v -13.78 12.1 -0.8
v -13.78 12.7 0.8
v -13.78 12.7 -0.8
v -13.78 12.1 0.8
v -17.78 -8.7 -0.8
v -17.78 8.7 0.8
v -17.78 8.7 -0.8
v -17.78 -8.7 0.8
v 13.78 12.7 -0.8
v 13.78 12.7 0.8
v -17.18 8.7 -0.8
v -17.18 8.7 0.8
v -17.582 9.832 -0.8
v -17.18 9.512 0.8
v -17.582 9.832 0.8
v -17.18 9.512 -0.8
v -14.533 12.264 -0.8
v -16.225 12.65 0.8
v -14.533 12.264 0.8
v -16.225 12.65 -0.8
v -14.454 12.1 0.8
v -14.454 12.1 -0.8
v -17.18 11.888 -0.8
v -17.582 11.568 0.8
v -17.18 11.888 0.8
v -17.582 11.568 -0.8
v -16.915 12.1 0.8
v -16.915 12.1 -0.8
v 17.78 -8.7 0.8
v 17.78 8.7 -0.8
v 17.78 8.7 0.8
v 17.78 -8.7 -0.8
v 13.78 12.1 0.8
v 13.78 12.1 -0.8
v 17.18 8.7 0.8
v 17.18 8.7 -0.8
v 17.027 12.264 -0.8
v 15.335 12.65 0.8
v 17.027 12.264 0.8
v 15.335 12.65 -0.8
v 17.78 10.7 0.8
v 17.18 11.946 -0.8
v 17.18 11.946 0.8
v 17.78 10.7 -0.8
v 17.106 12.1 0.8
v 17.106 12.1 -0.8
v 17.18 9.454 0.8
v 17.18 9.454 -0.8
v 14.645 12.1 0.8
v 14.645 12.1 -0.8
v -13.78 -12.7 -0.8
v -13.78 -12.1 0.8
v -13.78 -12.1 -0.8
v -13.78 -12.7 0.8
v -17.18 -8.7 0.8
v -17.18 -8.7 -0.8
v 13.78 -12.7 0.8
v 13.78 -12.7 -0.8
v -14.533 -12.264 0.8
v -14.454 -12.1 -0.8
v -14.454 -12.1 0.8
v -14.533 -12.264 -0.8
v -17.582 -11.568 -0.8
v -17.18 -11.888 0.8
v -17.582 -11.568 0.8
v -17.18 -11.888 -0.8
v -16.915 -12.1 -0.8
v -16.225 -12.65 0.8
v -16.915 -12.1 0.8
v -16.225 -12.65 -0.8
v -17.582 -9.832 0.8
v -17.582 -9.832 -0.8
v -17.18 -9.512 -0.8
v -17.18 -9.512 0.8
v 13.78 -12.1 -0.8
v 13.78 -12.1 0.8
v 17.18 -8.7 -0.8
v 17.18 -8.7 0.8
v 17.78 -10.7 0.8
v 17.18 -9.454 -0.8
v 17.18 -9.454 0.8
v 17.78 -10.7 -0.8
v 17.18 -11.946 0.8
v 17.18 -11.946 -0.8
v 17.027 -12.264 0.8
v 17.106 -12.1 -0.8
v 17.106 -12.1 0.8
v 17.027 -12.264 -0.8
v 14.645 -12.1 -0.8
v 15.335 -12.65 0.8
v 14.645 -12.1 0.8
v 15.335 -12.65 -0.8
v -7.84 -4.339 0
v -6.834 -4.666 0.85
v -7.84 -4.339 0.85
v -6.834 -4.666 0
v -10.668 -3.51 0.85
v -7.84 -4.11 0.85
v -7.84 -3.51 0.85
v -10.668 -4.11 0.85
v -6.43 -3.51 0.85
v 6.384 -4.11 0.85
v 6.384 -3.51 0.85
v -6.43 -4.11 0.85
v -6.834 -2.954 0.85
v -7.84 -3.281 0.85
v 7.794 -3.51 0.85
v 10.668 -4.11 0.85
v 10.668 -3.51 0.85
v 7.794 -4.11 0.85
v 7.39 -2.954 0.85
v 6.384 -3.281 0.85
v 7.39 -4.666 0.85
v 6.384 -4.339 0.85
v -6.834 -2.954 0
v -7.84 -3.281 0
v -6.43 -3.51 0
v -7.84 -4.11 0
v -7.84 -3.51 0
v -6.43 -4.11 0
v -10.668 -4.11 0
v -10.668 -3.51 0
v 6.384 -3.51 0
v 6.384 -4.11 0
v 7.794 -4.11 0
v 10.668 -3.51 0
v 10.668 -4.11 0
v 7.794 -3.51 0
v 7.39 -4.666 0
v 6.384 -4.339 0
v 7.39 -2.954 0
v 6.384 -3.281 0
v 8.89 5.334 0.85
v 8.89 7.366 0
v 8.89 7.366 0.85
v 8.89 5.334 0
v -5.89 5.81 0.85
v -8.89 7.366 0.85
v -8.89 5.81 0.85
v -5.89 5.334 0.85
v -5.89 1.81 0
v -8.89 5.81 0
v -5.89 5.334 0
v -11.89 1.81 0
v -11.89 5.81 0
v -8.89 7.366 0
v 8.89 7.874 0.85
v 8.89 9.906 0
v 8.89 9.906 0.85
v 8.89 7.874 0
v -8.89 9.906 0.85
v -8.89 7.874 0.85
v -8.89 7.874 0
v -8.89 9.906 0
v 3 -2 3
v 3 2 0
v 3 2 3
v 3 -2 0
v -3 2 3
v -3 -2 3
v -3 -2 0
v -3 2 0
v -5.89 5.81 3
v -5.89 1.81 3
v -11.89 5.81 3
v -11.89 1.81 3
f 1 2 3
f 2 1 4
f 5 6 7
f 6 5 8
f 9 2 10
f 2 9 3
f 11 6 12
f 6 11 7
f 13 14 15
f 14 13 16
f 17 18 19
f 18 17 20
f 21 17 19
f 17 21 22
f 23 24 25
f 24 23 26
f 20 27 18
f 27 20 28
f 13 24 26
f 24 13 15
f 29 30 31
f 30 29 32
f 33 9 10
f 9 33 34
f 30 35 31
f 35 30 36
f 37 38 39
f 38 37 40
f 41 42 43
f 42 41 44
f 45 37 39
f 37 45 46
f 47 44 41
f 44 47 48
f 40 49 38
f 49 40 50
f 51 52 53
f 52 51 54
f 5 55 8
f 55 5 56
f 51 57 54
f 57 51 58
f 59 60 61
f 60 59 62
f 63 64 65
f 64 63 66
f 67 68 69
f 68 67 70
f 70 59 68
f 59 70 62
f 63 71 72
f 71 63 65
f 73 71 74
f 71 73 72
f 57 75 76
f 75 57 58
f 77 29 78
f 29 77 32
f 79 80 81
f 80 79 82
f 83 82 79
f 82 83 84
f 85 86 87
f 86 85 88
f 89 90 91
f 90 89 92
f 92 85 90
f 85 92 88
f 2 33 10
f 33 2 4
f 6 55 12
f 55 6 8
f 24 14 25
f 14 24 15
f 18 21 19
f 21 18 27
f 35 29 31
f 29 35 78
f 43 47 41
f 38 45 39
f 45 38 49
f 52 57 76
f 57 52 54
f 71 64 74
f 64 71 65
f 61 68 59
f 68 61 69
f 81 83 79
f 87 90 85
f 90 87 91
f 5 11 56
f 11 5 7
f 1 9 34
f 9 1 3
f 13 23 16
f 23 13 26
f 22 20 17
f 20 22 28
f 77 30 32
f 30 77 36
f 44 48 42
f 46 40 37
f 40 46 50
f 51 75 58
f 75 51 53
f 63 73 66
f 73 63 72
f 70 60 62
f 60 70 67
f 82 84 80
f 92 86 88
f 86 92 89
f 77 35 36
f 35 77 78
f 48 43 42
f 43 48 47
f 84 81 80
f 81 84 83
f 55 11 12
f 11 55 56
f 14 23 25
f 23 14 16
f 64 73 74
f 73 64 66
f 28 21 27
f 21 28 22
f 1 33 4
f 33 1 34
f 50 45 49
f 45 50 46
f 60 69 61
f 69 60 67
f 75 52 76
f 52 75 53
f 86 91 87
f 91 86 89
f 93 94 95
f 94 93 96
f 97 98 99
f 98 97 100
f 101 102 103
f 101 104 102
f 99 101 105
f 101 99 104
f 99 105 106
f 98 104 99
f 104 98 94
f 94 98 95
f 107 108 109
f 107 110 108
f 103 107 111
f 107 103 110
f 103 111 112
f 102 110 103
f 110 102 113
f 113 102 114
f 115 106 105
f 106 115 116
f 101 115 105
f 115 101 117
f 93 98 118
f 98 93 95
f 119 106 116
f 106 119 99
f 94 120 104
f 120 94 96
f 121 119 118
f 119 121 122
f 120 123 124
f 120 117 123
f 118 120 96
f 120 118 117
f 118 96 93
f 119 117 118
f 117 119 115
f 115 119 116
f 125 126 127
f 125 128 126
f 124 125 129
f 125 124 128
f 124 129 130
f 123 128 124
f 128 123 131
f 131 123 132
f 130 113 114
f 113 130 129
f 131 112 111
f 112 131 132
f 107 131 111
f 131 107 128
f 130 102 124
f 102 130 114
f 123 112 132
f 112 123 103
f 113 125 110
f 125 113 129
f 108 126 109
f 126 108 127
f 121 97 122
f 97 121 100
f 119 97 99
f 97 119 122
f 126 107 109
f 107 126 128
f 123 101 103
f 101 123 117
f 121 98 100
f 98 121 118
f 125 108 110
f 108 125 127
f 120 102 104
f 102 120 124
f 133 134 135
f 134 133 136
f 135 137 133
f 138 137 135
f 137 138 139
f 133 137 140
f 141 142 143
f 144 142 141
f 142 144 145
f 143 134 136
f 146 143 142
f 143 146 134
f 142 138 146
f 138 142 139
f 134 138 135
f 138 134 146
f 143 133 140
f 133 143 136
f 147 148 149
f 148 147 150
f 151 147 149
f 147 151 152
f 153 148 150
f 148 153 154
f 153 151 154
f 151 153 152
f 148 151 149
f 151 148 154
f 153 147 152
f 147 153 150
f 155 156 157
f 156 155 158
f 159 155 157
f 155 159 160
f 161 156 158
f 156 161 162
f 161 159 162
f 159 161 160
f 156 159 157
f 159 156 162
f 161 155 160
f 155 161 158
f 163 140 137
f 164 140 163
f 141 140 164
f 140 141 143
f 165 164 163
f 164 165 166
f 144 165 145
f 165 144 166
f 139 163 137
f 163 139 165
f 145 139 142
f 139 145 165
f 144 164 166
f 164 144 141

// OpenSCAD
// Parameters
pcb_length = 35.56; //[17.78:71.12:0.1]
pcb_width = 25.4; //[12.7:50.8:0.1]
pcb_thickness = 1.6; //[0.8:3.2:0.1]
corner_radius = 2.0; //[0.5:6.0:0.1]
edge_chamfer = 0.6; //[0.2:1.5:0.1]
mount_hole_diameter = 3.2; //[2.0:5.0:0.1]
mount_hole_edge_offset_x = 3.5; //[2.0:8.0:0.1]
mount_hole_edge_offset_y = 3.5; //[2.0:8.0:0.1]
copper_thickness = 0.05; //[0.02:0.2:0.01]
silkscreen_thickness = 0.05; //[0.02:0.2:0.01]
pad_diameter = 1.8; //[1.0:3.5:0.1]
trace_width = 0.6; //[0.2:2.0:0.1]
component_body_height = 3.0; //[1.0:10.0:0.1]
component_body_length = 6.0; //[2.0:15.0:0.1]
component_body_width = 4.0; //[2.0:12.0:0.1]
overlap = 0.8; //[0.2:2.0:0.1]

// Base Shapes
module pcb_body_base() {
  cube([pcb_length, pcb_width, pcb_thickness], center=true);
}

module rounded_corner_cyl() {
  cylinder(r=corner_radius, h=pcb_thickness + overlap*2, center=true);
}

module corner_cut_box() {
  cube([corner_radius*2, corner_radius*2, pcb_thickness + overlap*2], center=true);
}

module edge_chamfer_cut_top() {
  cube([pcb_length - edge_chamfer*2, pcb_width - edge_chamfer*2, pcb_thickness], center=true);
}

module edge_chamfer_cut_bottom() {
  cube([pcb_length - edge_chamfer*2, pcb_width - edge_chamfer*2, pcb_thickness], center=true);
}

module mount_hole_cyl() {
  cylinder(r=mount_hole_diameter/2, h=pcb_thickness + overlap*4, center=true);
}

module copper_pad_cyl() {
  cylinder(r=pad_diameter/2, h=copper_thickness + overlap, center=true);
}

module copper_trace_box() {
  cube([pcb_length*0.6, trace_width, copper_thickness + overlap], center=true);
}

module silkscreen_box() {
  cube([pcb_length*0.5, pcb_width*0.08, silkscreen_thickness + overlap], center=true);
}

module component_body_box() {
  cube([component_body_length, component_body_width, component_body_height], center=true);
}

// Operations
module corner_diff_tl() {
  difference() {
    translate([-pcb_length/2 + corner_radius, pcb_width/2 - corner_radius, 0]) corner_cut_box();
    translate([-pcb_length/2 + corner_radius, pcb_width/2 - corner_radius, 0]) rounded_corner_cyl();
  }
}

module corner_diff_tr() {
  difference() {
    translate([pcb_length/2 - corner_radius, pcb_width/2 - corner_radius, 0]) corner_cut_box();
    translate([pcb_length/2 - corner_radius, pcb_width/2 - corner_radius, 0]) rounded_corner_cyl();
  }
}

module corner_diff_bl() {
  difference() {
    translate([-pcb_length/2 + corner_radius, -pcb_width/2 + corner_radius, 0]) corner_cut_box();
    translate([-pcb_length/2 + corner_radius, -pcb_width/2 + corner_radius, 0]) rounded_corner_cyl();
  }
}

module corner_diff_br() {
  difference() {
    translate([pcb_length/2 - corner_radius, -pcb_width/2 + corner_radius, 0]) corner_cut_box();
    translate([pcb_length/2 - corner_radius, -pcb_width/2 + corner_radius, 0]) rounded_corner_cyl();
  }
}

module pcb_with_rounded_corners() {
  difference() {
    pcb_body_base();
    corner_diff_tl();
    corner_diff_tr();
    corner_diff_bl();
    corner_diff_br();
  }
}

module pcb_with_edge_chamfer() {
  difference() {
    pcb_with_rounded_corners();
    translate([0, 0, pcb_thickness/2]) edge_chamfer_cut_top();
    translate([0, 0, -pcb_thickness/2]) edge_chamfer_cut_bottom();
  }
}

module pcb_body() {
  difference() {
    pcb_with_edge_chamfer();
    translate([-pcb_length/2 + mount_hole_edge_offset_x, pcb_width/2 - mount_hole_edge_offset_y, 0]) mount_hole_cyl();
    translate([pcb_length/2 - mount_hole_edge_offset_x, pcb_width/2 - mount_hole_edge_offset_y, 0]) mount_hole_cyl();
    translate([-pcb_length/2 + mount_hole_edge_offset_x, -pcb_width/2 + mount_hole_edge_offset_y, 0]) mount_hole_cyl();
    translate([pcb_length/2 - mount_hole_edge_offset_x, -pcb_width/2 + mount_hole_edge_offset_y, 0]) mount_hole_cyl();
  }
}

module copper_pads_traces() {
  union() {
    translate([-pcb_length*0.2, -pcb_width*0.15, pcb_thickness/2 + copper_thickness/2 - overlap/2]) copper_pad_cyl();
    translate([pcb_length*0.2, -pcb_width*0.15, pcb_thickness/2 + copper_thickness/2 - overlap/2]) copper_pad_cyl();
    translate([0, -pcb_width*0.15, pcb_thickness/2 + copper_thickness/2 - overlap/2]) copper_trace_box();
  }
}

module silkscreen_markings() {
  union() {
    translate([0, pcb_width*0.25, pcb_thickness/2 + silkscreen_thickness/2 - overlap/2]) silkscreen_box();
    translate([0, pcb_width*0.35, pcb_thickness/2 + silkscreen_thickness/2 - overlap/2]) silkscreen_box();
  }
}

module components() {
  union() {
    translate([0, 0, pcb_thickness/2 + component_body_height/2 - overlap]) component_body_box();
    translate([-pcb_length*0.25, pcb_width*0.15, pcb_thickness/2 + component_body_height/2 - overlap]) component_body_box();
  }
}

// Final Model
module pcb_complete_model() {
  union() {
    pcb_body();
    copper_pads_traces();
    silkscreen_markings();
    components();
  }
}

// Render the complete PCB model
color([0.0, 0.4, 0.2]) pcb_complete_model(); // PCB color
